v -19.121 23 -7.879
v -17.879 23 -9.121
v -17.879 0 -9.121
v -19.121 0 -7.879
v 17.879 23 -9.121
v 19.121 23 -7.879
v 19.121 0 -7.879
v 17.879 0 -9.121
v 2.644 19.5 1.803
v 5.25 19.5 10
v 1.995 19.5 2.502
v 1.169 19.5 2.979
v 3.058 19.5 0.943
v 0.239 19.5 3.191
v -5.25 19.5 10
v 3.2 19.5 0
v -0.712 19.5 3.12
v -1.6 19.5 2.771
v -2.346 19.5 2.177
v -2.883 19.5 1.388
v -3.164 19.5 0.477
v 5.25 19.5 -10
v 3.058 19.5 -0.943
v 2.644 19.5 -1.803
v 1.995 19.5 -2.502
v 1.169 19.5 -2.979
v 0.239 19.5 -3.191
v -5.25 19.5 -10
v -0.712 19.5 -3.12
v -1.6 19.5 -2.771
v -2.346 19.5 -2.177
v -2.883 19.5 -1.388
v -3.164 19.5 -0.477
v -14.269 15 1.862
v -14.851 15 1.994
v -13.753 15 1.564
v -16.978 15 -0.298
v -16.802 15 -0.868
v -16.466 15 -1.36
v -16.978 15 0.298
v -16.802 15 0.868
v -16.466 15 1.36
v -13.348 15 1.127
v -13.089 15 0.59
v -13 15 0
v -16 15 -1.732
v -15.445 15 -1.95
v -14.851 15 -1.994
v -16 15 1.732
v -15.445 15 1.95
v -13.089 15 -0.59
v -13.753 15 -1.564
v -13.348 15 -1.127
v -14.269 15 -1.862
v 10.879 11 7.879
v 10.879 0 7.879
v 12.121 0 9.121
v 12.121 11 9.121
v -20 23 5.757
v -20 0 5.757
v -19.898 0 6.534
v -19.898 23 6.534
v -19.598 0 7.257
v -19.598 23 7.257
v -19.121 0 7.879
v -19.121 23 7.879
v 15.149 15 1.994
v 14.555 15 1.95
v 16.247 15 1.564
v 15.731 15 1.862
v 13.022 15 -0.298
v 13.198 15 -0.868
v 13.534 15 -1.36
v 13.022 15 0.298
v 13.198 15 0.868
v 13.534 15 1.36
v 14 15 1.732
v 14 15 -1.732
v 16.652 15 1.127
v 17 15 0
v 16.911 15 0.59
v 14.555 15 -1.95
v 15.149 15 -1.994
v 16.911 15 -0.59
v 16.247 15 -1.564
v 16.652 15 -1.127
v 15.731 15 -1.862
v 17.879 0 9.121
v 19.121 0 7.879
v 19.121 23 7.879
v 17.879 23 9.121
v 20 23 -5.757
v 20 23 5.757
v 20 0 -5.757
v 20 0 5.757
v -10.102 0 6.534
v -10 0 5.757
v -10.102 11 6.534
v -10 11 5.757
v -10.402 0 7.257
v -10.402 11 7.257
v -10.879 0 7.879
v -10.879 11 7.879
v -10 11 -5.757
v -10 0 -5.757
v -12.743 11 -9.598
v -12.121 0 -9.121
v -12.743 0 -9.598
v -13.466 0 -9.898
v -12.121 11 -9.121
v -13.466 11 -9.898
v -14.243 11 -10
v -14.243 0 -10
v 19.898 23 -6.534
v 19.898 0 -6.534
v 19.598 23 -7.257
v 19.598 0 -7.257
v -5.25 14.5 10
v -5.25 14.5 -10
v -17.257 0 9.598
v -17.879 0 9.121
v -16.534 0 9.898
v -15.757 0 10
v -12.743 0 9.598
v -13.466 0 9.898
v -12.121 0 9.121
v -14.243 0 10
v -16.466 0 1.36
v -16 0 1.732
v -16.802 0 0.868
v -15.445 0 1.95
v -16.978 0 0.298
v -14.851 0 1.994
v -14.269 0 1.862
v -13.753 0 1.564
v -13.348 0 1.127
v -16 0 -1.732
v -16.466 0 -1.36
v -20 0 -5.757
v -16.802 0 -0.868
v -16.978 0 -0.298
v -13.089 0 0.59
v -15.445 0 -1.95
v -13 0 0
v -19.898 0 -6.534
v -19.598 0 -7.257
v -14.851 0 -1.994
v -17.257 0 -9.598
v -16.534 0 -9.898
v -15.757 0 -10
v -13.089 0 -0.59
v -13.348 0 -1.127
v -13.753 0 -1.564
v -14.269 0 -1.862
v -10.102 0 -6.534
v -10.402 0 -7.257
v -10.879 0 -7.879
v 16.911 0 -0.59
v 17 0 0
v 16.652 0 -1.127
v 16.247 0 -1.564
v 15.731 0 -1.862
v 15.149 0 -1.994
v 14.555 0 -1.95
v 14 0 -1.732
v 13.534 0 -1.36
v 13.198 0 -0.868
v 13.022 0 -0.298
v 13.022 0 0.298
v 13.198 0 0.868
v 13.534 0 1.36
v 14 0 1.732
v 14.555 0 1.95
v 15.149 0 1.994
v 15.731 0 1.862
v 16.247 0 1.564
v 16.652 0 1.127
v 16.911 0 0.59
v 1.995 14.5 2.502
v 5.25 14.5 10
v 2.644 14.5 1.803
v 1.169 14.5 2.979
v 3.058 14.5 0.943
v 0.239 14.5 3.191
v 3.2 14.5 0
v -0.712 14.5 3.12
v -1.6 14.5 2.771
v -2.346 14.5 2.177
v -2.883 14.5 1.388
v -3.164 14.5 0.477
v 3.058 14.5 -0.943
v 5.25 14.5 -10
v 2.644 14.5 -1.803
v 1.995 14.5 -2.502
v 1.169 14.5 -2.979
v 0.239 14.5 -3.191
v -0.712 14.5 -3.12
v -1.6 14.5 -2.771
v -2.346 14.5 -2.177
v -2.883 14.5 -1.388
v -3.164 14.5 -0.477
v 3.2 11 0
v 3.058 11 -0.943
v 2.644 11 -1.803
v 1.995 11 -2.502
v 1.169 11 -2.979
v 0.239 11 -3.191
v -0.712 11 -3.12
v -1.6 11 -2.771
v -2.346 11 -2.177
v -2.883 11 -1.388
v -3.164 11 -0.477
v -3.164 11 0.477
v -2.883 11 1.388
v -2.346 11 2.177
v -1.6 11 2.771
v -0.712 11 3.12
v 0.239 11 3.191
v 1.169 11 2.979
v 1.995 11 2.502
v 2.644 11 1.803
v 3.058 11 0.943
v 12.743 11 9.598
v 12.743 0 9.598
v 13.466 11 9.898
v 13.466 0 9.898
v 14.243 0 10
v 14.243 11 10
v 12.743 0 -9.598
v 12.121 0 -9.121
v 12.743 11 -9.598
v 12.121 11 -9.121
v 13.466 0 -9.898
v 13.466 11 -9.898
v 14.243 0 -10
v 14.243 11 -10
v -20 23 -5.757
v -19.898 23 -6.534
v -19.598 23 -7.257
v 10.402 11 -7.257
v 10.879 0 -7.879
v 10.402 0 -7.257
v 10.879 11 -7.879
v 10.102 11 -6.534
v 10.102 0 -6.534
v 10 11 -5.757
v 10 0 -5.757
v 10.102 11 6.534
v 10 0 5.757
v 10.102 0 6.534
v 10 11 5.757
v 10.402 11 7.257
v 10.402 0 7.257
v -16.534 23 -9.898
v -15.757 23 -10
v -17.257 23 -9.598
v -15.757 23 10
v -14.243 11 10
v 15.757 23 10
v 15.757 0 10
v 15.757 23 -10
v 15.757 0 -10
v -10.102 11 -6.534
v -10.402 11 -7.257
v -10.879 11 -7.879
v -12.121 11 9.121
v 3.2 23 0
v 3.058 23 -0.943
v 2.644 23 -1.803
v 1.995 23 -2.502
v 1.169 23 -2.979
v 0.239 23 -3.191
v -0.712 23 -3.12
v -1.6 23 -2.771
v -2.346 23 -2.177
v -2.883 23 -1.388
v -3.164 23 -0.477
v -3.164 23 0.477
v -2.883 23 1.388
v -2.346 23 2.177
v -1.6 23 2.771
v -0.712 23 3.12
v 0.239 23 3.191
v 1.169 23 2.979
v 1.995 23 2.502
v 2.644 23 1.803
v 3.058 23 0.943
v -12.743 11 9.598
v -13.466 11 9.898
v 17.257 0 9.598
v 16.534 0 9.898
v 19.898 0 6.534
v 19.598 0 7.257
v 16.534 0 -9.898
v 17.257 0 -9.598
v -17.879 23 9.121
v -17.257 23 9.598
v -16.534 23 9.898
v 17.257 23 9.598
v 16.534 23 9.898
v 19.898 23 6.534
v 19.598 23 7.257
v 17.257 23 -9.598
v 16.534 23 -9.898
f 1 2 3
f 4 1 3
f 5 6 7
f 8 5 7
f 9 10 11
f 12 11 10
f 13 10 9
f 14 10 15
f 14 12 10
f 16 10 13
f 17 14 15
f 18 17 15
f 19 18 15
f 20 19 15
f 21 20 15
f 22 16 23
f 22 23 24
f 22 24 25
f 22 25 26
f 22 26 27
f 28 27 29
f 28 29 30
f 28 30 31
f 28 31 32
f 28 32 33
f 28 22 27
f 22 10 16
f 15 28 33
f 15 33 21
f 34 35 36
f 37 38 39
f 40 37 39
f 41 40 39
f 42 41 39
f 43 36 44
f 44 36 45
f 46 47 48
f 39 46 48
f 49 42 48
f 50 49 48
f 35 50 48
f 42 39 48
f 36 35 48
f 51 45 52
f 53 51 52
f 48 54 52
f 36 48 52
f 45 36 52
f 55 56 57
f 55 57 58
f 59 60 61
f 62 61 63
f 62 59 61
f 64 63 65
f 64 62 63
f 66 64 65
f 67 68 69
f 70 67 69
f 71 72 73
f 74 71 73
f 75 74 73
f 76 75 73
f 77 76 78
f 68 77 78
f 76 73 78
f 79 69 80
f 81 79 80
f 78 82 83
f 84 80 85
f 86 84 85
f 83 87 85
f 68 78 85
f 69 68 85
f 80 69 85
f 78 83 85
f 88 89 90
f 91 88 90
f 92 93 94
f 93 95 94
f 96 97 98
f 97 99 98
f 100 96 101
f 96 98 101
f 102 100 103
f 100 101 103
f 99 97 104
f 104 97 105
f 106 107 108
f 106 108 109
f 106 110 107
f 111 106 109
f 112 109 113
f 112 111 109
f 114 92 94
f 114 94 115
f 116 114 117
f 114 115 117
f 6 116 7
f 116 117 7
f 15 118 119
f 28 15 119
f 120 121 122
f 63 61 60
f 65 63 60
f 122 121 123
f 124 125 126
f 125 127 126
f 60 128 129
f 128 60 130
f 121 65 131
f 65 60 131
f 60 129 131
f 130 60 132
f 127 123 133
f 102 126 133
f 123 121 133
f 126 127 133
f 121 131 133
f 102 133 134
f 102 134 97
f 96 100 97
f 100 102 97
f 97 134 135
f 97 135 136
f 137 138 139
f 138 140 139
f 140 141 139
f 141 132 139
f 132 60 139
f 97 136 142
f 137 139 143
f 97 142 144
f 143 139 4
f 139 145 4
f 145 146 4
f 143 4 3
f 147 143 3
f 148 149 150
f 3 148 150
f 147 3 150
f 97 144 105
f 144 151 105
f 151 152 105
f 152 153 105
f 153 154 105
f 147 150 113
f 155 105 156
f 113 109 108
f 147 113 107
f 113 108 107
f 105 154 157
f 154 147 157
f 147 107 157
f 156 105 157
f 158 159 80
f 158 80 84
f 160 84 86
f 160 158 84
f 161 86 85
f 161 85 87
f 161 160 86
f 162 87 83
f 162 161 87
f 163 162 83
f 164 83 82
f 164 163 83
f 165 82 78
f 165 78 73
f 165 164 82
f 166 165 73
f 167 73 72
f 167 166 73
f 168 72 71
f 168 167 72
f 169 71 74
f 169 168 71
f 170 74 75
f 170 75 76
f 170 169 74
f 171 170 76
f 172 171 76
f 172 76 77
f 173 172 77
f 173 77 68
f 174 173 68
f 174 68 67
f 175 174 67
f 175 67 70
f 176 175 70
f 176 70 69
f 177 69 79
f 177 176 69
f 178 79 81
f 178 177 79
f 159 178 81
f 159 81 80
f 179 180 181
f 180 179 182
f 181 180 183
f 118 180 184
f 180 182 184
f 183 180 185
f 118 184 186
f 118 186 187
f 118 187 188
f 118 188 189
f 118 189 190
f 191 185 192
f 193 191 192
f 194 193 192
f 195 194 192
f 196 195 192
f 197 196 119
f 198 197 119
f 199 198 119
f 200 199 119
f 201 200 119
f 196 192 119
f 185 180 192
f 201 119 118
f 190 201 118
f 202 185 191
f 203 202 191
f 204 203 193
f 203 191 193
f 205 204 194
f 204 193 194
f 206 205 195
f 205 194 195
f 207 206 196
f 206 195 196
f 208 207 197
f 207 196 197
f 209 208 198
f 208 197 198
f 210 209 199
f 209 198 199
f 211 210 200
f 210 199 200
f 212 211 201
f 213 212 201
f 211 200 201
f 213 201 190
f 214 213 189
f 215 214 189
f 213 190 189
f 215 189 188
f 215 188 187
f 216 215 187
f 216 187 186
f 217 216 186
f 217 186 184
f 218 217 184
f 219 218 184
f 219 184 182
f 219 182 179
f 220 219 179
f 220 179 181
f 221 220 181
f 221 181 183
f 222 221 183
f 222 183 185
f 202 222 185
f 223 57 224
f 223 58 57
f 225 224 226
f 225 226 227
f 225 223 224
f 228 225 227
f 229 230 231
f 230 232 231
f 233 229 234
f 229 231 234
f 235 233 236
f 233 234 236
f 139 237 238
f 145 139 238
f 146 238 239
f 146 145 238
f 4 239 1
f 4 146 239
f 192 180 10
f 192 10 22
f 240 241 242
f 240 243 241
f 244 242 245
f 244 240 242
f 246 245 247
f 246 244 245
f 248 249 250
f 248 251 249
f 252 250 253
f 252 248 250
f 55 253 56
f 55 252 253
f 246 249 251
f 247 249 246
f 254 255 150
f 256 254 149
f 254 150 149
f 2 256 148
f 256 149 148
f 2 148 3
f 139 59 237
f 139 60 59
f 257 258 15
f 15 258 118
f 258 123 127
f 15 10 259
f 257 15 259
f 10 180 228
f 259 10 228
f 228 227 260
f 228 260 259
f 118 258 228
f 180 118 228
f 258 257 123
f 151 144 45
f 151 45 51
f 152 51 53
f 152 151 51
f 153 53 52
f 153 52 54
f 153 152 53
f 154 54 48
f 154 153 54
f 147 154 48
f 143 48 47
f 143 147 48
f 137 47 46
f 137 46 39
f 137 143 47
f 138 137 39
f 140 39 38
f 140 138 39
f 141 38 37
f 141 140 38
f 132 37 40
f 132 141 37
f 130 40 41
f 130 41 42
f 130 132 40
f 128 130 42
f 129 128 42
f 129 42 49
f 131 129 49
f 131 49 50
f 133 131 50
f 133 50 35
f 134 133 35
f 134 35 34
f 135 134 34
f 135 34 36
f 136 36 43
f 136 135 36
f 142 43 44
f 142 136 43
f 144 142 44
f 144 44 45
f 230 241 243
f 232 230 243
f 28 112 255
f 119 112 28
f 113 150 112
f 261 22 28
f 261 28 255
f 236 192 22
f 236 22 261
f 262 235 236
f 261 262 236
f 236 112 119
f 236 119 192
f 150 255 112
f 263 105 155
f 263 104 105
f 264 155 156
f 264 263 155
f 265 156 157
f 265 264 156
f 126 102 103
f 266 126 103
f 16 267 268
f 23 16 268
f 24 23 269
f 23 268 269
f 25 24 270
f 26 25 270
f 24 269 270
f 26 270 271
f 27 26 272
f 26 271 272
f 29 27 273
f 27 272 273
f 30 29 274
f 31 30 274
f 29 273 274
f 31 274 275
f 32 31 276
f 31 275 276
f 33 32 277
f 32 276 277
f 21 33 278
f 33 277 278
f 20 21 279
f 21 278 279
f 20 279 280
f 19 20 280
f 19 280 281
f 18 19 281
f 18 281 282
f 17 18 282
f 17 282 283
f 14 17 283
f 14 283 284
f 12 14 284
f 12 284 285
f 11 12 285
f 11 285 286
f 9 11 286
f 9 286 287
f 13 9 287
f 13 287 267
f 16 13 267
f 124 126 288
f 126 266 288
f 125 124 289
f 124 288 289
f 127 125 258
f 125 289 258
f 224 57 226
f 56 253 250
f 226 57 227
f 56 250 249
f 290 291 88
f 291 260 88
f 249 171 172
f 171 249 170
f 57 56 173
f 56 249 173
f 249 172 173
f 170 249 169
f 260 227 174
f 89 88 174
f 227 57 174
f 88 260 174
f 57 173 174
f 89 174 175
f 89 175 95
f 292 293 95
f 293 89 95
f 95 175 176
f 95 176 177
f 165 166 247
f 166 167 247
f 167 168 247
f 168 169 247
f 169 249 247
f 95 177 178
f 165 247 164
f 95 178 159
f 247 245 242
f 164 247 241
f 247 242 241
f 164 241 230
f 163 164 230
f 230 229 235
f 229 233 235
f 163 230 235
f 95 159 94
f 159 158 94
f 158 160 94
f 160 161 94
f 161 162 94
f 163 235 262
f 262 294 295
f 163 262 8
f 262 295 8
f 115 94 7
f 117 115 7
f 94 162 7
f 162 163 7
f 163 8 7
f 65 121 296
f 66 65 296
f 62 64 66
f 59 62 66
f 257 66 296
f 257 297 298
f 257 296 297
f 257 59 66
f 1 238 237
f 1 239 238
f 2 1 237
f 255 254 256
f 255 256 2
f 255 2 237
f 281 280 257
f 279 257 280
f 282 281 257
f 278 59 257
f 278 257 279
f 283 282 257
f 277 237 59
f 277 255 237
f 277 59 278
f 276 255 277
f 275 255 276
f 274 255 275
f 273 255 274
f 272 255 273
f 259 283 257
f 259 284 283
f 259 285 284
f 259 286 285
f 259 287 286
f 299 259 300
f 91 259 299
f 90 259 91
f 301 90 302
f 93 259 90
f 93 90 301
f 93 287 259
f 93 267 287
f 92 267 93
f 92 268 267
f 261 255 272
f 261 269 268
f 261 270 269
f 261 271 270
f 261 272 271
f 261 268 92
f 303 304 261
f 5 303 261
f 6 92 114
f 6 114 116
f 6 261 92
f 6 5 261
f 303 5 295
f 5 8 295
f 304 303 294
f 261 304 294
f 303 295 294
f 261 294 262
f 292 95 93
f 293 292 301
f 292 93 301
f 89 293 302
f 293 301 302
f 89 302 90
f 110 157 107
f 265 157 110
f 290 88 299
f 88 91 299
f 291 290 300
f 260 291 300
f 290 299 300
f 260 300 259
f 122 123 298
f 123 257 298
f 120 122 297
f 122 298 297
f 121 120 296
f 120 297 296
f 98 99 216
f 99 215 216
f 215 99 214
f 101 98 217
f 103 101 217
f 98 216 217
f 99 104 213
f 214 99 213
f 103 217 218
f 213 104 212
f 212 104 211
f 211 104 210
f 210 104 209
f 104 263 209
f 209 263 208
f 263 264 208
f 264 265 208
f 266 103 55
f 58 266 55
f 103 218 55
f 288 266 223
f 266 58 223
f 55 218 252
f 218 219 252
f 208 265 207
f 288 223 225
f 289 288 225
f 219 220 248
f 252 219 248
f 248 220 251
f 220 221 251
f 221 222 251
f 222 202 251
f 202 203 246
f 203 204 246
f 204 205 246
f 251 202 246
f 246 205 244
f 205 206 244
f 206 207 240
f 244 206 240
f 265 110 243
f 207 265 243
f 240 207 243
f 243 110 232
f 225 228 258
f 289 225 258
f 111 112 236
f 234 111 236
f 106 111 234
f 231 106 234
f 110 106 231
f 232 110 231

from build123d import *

# Parameters (mm, degrees)
ESQUISSE1_W             = 10
ESQUISSE1_H             = 20
BOSS_EXTRU_1_DEPTH      = 11
BOSS_EXTRU_1_2_DEPTH    = 11
ESQUISSE3_W             = 40
ESQUISSE3_H             = 20
BOSS_EXTRU_2_DEPTH      = 12
ESQUISSE4_R             = 3.2
ENL_V_MAT_EXTRU_1_DEPTH = 12
ESQUISSE1_3_R           = 2
ENL_V_MAT_EXTRU_3_DEPTH = 15
CHANFREIN1_SIZE         = 3
CONG_1_R                = 3
ESQUISSE6_W             = 10.5
ESQUISSE6_H             = 20
ENL_V_MAT_EXTRU_5_DEPTH = 5


with BuildPart() as part:
    # Esquisse1 → Boss.-Extru.1 (new body)
    with BuildSketch(Plane(origin=(0, 0, 0), x_dir=(1, 0, 0), z_dir=(0, 1, 0))):
        with Locations((-15, 0)):
            Rectangle(ESQUISSE1_W, ESQUISSE1_H)
    extrude(amount=BOSS_EXTRU_1_DEPTH)



with BuildPart() as body_2:
    # Esquisse1 → Boss.-Extru.1 2 (new body)
    with BuildSketch(Plane(origin=(0, 0, 0), x_dir=(1, 0, 0), z_dir=(0, 1, 0))):
        with Locations((15, 0)):
            Rectangle(ESQUISSE1_W, ESQUISSE1_H)
    extrude(amount=BOSS_EXTRU_1_2_DEPTH)


with BuildPart() as part_1:
    add(part.part)

    add(body_2.part)  # Boss.-Extru.2 merges body 2
    # Esquisse3 → Boss.-Extru.2 (add)
    with BuildSketch(Plane(origin=(0, 11, 0), x_dir=(1, 0, 0), z_dir=(0, 1, 0))):
        Rectangle(ESQUISSE3_W, ESQUISSE3_H)
    extrude(amount=BOSS_EXTRU_2_DEPTH)

    # Esquisse4 → Enl_v. mat.-Extru.1 (cut)
    with BuildSketch(Plane(origin=(0, 23, 0), x_dir=(1, 0, 0), z_dir=(0, 1, 0))):
        Circle(ESQUISSE4_R)
    extrude(amount=-ENL_V_MAT_EXTRU_1_DEPTH, mode=Mode.SUBTRACT)

    # Esquisse1_3 → Enl_v. mat.-Extru.3 (cut)
    with BuildSketch(Plane(origin=(0, 0, 0), x_dir=(1, 0, 0), z_dir=(0, 1, 0))):
        with Locations((-15, 0)):
            Circle(ESQUISSE1_3_R)
        with Locations((15, 0)):
            Circle(ESQUISSE1_3_R)
    extrude(amount=ENL_V_MAT_EXTRU_3_DEPTH, mode=Mode.SUBTRACT)

    # Chanfrein1
    chanfrein1_edges = [part_1.edges().sort_by_distance(p)[0] for p in [
        (20, 11.5, 10),
        (20, 11.5, -10),
        (10, 5.5, -10),
        (10, 5.5, 10),
        (-20, 11.5, 10),
        (-20, 11.5, -10),
        (-10, 5.5, -10),
        (-10, 5.5, 10),
    ]]
    chamfer(chanfrein1_edges, length=CHANFREIN1_SIZE)

    # Cong_1
    cong_1_edges = [part_1.edges().sort_by_distance(p)[0] for p in [
        (10, 5.5, 7),
        (10, 5.5, -7),
        (-17, 11.5, -10),
        (-13, 5.5, -10),
        (17, 11.5, -10),
        (13, 5.5, -10),
        (20, 11.5, 7),
        (20, 11.5, -7),
        (-17, 11.5, 10),
        (17, 11.5, 10),
        (-13, 5.5, 10),
        (13, 5.5, 10),
        (-10, 5.5, 7),
        (-10, 5.5, -7),
        (-20, 11.5, 7),
        (-20, 11.5, -7),
    ]]
    fillet(cong_1_edges, radius=CONG_1_R)

    # Esquisse6 → Enl_v. mat.-Extru.5 (cut)
    with BuildSketch(Plane(origin=(0, 14.5, 0), x_dir=(-1, 0, 0), z_dir=(0, -1, 0))):
        Rectangle(ESQUISSE6_W, ESQUISSE6_H)
    extrude(amount=-ENL_V_MAT_EXTRU_5_DEPTH, mode=Mode.SUBTRACT)


solid = part_1.part
